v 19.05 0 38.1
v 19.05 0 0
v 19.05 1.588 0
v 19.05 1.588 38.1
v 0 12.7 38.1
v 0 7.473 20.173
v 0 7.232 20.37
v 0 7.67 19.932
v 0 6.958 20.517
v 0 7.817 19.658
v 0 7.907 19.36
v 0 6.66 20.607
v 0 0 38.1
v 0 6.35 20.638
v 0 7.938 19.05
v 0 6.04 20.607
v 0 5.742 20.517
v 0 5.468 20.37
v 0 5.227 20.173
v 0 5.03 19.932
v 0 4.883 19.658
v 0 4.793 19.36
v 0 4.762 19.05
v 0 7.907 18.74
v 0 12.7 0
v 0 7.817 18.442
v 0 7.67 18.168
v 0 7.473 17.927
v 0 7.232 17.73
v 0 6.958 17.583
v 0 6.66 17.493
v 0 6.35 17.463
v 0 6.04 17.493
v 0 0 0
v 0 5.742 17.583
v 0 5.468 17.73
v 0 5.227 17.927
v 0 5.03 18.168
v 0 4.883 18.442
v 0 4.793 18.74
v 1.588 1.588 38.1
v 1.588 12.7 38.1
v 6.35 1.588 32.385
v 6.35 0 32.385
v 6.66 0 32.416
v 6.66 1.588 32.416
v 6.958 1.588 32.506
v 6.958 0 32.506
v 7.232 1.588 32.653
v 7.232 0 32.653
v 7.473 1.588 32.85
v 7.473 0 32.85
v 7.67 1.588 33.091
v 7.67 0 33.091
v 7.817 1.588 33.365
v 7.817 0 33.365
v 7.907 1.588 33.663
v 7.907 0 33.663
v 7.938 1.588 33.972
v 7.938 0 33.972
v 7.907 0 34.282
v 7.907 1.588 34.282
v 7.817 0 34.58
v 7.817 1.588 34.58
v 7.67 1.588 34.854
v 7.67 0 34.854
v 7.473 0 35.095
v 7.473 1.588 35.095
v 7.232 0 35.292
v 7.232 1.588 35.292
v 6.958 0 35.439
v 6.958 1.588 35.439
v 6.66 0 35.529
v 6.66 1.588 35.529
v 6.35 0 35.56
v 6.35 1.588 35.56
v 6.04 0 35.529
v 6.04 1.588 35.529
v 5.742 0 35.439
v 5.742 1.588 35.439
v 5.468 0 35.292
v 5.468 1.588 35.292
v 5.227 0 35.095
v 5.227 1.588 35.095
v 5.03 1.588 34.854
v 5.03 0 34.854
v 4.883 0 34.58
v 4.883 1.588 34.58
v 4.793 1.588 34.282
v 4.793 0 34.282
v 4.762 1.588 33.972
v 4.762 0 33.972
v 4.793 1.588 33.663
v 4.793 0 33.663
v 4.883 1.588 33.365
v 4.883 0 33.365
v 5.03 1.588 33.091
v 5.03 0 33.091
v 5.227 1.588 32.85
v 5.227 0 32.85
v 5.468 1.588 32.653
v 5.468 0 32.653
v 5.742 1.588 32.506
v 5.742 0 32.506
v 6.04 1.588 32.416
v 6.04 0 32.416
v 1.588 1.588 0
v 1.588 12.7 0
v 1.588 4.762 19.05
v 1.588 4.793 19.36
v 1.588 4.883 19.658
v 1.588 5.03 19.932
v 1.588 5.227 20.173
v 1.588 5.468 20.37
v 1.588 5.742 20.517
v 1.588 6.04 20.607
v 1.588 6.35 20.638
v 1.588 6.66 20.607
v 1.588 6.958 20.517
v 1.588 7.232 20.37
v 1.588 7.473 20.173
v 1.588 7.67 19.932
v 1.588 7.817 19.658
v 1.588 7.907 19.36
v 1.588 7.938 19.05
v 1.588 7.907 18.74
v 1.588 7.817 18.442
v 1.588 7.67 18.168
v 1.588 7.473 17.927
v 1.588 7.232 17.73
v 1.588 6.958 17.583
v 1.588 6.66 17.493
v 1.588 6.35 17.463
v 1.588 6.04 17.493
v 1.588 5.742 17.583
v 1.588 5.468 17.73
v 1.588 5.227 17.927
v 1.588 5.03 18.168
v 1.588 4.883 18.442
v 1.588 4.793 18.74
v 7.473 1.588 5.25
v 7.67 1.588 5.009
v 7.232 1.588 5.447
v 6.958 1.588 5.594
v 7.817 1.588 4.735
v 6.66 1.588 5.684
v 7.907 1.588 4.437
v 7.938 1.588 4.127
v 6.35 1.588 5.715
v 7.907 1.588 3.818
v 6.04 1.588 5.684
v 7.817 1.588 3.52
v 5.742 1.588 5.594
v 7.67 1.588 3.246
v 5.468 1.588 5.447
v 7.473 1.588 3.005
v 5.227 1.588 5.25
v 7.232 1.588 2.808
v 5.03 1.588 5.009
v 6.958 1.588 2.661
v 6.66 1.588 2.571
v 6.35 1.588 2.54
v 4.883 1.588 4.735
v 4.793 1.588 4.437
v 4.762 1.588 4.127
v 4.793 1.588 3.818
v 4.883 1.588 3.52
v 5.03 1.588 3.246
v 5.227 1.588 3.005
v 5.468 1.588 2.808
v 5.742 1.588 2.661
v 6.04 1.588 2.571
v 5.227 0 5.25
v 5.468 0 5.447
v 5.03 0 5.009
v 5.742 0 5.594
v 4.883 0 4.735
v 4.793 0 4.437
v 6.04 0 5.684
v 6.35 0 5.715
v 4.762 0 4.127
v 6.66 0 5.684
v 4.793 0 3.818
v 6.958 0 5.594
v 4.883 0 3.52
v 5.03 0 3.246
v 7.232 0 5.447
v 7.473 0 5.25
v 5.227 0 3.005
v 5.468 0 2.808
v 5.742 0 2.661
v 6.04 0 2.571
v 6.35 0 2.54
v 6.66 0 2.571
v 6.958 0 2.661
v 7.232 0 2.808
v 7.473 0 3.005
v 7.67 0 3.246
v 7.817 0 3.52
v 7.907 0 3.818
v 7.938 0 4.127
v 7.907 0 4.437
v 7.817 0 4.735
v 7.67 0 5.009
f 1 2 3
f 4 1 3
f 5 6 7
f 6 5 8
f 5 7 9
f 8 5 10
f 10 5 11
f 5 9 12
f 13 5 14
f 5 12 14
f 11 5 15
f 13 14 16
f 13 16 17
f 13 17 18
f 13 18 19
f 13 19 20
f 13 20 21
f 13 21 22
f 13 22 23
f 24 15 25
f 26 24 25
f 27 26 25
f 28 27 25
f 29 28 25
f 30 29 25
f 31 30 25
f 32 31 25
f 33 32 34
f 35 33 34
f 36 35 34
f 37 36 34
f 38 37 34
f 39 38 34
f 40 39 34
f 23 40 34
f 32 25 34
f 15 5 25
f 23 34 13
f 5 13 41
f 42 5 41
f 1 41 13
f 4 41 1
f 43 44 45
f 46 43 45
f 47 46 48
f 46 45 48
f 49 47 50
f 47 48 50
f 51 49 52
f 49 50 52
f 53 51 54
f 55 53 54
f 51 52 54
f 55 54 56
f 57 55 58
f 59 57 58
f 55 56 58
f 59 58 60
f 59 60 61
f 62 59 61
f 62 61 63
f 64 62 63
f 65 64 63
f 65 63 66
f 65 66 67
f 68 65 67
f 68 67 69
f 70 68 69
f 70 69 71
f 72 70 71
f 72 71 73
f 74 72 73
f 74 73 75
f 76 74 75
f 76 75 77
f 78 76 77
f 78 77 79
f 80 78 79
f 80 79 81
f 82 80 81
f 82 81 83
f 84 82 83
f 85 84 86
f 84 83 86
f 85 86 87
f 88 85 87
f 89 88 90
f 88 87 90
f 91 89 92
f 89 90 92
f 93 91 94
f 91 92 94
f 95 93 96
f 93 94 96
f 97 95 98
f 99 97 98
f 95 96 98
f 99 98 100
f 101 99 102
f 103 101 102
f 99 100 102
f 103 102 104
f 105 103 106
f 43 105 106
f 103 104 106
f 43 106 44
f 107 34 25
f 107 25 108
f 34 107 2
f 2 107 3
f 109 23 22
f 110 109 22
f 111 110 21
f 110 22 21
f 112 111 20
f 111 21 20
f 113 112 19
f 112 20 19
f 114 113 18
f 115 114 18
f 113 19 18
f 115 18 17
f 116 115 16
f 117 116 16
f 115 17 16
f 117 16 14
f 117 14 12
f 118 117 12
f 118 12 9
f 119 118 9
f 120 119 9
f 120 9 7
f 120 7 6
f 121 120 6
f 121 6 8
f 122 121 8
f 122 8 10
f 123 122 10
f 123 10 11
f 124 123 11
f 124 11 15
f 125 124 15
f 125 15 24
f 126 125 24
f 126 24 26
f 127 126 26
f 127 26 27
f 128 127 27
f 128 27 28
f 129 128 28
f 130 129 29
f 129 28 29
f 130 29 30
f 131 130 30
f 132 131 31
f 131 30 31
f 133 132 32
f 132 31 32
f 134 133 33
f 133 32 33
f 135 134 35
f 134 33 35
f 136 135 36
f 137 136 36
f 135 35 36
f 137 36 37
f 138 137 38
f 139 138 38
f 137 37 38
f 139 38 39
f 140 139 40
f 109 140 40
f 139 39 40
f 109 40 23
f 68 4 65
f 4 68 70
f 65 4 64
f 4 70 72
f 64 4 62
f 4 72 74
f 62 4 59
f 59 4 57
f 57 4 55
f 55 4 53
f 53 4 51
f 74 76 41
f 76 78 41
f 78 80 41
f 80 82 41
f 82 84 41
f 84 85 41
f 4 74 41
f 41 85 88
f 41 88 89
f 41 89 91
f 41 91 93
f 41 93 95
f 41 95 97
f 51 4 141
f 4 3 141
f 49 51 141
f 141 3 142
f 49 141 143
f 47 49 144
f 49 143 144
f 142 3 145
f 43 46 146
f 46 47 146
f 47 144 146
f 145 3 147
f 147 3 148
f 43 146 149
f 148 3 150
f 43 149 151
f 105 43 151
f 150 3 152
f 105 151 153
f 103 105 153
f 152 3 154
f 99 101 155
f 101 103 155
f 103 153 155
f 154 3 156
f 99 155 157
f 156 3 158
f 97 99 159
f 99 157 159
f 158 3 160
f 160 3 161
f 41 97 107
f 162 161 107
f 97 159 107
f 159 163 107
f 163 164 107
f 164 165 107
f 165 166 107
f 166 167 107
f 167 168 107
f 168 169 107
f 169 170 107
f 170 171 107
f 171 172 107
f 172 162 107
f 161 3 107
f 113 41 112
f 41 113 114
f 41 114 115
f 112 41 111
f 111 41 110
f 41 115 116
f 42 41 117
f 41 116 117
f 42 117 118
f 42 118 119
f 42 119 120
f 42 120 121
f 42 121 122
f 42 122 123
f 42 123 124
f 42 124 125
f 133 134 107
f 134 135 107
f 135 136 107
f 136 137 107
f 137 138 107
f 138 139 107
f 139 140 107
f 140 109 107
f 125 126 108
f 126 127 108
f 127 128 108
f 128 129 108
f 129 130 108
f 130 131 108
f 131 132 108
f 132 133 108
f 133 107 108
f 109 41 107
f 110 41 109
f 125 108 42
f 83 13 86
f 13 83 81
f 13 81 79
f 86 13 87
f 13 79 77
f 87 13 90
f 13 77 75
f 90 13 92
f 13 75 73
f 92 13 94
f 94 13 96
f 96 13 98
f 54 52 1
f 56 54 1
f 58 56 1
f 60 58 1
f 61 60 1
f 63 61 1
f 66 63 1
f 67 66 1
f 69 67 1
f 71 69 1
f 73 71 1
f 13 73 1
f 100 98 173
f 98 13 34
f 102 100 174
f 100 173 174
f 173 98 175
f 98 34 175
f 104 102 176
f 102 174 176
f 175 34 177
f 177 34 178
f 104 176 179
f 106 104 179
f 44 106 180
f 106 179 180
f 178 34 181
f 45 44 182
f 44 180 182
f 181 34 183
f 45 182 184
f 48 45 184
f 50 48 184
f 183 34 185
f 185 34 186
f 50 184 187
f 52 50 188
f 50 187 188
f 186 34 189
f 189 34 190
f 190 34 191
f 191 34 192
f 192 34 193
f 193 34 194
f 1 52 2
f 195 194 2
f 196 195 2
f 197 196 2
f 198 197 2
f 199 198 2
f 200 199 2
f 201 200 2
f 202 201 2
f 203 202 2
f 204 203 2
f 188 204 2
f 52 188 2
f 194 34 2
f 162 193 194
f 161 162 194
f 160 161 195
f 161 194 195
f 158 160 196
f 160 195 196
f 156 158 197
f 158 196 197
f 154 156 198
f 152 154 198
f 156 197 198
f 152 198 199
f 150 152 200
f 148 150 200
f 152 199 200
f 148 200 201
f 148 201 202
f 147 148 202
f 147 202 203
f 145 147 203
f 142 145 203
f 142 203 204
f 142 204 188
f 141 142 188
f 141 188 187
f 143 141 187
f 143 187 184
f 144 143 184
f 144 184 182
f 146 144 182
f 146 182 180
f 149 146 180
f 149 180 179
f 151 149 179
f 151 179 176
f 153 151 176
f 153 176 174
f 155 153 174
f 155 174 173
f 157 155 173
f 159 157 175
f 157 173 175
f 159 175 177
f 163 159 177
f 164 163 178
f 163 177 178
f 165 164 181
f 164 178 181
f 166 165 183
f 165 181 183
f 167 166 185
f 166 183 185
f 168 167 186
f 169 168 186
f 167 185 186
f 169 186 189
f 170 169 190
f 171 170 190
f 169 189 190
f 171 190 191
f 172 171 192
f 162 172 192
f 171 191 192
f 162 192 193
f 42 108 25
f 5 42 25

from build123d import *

# Parameters (mm, degrees)
BOSS_EXTRUDE1_DEPTH = 38.1
SKETCH2_R           = 1.5875
CUT_EXTRUDE1_DEPTH  = 45.45
SKETCH3_R           = 1.5875
CUT_EXTRUDE2_DEPTH  = 45.45


with BuildPart() as part:
    # Sketch1 → Boss-Extrude1 (new body)
    with BuildSketch(Plane.XY):
        Polygon((0, 12.7), (0, 0), (19.05, 0), (19.05, 1.5875), (1.5875, 1.5875), (1.5875, 12.7), align=None)
    extrude(amount=BOSS_EXTRUDE1_DEPTH)

    # Sketch2 → Cut-Extrude1 (cut, through all)
    with BuildSketch(Plane.ZY):
        with Locations(Location((19.05, 6.35, 0), (0, 0, 270))):
            Circle(SKETCH2_R)
    extrude(amount=-CUT_EXTRUDE1_DEPTH, mode=Mode.SUBTRACT)

    # Sketch3 → Cut-Extrude2 (cut, through all)
    with BuildSketch(Plane.XZ):
        with Locations(Location((6.35, 4.1275, 0), (0, 0, 270))):
            Circle(SKETCH3_R)
        with Locations(Location((6.35, 33.9725, 0), (0, 0, 270))):
            Circle(SKETCH3_R)
    extrude(amount=-CUT_EXTRUDE2_DEPTH, mode=Mode.SUBTRACT)


solid = part.part
